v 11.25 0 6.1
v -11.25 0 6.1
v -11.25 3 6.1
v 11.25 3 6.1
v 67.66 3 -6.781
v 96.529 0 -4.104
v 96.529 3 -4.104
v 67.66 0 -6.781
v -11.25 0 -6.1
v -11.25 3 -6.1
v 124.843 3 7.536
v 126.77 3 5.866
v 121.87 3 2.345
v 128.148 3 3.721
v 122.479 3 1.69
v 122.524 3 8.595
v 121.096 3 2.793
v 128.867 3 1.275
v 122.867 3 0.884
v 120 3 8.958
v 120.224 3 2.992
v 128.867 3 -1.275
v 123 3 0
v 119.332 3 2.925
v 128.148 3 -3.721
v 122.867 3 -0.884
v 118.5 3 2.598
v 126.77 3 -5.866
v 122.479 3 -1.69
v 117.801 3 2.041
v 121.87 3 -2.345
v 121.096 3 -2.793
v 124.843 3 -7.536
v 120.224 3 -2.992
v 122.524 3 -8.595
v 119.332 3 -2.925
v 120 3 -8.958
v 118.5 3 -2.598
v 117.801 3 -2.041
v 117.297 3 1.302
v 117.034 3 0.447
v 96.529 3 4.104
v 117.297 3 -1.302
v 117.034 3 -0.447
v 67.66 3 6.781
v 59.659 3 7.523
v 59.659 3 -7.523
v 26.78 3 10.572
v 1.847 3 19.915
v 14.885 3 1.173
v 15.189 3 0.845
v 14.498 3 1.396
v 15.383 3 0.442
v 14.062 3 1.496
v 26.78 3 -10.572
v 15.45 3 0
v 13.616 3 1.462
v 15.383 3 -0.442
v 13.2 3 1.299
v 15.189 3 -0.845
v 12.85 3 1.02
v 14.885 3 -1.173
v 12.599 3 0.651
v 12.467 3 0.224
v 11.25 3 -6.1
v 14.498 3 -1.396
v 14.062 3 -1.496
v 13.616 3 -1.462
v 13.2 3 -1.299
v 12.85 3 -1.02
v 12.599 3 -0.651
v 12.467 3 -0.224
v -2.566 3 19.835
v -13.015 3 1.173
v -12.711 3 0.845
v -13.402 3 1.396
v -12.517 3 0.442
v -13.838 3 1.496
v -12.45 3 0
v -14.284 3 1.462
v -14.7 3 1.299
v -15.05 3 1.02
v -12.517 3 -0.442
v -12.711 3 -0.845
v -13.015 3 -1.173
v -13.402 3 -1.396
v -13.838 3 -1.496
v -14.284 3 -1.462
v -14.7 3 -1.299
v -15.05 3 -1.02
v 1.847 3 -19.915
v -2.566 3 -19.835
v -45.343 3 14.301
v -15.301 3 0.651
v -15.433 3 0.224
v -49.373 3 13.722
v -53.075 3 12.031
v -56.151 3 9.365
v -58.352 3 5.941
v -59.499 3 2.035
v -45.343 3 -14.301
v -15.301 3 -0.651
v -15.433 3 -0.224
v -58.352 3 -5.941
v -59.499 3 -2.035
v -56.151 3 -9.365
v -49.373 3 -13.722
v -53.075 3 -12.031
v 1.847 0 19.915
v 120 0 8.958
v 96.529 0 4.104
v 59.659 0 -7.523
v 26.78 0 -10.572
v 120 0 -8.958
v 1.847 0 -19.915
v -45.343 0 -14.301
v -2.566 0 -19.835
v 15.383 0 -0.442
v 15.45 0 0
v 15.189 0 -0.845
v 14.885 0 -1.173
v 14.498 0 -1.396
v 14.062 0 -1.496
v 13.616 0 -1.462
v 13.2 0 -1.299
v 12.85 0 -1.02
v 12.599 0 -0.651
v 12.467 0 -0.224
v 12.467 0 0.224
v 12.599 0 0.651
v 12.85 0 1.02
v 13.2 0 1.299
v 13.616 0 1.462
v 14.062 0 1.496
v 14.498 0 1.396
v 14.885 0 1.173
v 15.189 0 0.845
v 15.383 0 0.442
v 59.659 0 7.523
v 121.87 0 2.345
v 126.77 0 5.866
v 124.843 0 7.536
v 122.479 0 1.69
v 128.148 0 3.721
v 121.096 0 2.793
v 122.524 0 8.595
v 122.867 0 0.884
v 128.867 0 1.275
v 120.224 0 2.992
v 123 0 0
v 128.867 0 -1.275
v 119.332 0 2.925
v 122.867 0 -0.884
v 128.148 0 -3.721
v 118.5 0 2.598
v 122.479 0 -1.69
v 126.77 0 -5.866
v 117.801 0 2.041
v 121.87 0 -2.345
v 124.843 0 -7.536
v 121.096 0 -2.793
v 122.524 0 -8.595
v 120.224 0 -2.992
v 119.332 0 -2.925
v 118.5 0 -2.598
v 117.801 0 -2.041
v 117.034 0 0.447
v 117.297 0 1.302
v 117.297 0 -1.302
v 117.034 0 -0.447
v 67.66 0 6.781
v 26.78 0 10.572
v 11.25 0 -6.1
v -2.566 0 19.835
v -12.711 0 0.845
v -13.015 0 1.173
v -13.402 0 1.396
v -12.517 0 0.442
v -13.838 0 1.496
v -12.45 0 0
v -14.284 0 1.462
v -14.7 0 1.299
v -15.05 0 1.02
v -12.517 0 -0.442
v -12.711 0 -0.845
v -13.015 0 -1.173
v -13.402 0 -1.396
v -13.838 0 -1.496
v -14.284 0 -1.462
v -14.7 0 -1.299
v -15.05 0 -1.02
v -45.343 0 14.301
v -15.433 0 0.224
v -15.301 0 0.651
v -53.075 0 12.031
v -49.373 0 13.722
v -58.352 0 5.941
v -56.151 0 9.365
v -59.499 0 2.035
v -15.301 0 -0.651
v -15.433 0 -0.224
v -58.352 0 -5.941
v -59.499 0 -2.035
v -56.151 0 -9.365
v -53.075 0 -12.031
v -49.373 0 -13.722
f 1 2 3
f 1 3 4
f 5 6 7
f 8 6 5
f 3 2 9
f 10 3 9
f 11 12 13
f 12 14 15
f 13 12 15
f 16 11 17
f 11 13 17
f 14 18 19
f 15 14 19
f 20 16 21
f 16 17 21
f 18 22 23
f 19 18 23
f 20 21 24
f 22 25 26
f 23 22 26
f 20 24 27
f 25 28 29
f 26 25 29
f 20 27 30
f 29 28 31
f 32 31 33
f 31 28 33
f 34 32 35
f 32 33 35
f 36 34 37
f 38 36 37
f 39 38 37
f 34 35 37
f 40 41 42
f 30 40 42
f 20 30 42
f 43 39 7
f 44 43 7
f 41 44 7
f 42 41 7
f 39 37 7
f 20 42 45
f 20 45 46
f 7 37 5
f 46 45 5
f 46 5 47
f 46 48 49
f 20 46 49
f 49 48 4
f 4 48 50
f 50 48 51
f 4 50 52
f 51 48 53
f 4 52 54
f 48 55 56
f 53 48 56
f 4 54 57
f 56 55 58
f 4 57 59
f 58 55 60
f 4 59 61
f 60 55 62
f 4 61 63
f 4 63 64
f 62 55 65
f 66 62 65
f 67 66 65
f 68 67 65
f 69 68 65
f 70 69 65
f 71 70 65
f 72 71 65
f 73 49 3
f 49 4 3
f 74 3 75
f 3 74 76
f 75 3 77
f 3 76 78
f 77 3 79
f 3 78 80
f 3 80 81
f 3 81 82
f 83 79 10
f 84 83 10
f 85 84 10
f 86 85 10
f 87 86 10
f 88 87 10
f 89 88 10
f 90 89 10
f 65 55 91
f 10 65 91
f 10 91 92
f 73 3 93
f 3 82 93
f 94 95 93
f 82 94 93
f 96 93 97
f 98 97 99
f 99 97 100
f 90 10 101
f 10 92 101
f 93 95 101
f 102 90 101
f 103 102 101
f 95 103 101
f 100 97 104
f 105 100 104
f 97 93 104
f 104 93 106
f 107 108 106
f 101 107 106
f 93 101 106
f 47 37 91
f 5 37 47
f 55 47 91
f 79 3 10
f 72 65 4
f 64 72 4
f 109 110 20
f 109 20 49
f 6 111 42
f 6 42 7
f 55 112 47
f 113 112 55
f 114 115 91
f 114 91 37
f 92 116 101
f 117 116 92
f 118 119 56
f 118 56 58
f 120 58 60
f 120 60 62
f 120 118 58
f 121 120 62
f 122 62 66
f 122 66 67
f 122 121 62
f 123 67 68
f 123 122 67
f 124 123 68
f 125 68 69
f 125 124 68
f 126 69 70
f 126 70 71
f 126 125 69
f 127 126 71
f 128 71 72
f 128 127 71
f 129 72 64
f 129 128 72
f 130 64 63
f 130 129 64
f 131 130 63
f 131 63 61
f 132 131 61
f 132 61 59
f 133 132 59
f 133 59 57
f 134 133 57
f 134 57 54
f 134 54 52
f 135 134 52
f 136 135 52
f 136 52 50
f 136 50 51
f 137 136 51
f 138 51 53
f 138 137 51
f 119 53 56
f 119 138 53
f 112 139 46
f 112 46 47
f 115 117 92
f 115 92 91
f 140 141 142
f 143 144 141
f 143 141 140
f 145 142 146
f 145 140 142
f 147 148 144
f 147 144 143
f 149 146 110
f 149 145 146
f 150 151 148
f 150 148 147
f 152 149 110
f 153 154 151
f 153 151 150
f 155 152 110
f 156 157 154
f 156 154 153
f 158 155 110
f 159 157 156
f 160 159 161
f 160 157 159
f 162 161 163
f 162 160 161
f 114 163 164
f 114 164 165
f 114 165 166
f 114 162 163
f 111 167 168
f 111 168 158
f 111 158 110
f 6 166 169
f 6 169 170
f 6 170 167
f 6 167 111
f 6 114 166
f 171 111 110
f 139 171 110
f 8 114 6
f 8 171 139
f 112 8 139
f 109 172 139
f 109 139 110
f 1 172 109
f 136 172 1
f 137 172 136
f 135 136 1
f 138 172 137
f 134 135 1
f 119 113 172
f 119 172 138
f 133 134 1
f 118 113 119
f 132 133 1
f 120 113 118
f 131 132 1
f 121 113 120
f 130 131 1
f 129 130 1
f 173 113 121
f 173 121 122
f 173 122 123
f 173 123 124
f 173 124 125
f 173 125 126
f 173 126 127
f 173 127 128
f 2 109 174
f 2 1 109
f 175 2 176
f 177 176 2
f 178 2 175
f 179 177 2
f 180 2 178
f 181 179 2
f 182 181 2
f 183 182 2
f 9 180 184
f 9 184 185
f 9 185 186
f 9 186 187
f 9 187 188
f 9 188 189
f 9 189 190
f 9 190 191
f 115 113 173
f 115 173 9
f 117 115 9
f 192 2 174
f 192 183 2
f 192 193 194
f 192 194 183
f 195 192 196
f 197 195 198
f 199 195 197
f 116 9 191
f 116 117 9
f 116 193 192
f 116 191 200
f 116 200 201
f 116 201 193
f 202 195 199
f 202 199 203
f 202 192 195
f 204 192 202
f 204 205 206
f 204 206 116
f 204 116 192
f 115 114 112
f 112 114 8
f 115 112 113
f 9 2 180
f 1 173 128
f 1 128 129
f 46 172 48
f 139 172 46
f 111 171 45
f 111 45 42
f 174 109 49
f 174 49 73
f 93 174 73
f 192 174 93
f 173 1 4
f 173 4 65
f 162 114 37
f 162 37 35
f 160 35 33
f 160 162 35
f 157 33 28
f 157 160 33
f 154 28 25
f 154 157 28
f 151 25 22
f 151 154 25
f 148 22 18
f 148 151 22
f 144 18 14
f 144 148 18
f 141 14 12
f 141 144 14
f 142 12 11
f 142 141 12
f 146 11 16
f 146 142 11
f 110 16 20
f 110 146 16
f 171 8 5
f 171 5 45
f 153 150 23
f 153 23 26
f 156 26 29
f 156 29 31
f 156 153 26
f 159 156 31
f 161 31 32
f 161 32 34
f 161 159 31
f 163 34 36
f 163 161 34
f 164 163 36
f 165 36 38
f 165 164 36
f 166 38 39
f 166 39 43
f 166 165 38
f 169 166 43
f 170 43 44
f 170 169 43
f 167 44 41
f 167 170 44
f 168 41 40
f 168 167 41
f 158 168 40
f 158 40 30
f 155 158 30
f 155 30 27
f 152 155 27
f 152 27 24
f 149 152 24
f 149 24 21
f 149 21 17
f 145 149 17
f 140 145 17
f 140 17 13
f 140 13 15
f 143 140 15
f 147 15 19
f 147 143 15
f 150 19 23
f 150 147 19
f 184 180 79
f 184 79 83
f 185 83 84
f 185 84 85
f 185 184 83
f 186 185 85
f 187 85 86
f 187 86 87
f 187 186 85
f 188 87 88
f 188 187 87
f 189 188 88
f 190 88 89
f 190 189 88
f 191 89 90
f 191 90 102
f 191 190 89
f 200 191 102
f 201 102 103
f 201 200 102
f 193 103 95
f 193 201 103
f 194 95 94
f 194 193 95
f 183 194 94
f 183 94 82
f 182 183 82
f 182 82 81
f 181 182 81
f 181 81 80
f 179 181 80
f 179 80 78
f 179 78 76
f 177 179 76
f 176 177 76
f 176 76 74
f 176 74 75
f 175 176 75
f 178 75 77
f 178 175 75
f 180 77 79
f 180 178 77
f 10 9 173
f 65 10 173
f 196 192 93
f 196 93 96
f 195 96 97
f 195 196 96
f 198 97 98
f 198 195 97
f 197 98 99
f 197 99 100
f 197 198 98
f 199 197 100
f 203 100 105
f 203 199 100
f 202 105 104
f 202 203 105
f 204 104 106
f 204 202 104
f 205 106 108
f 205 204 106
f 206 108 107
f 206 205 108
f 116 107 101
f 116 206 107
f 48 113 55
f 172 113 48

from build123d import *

# Parameters (mm, degrees)
SKETCH1_R           = 1.5
SKETCH1_R_2         = 3
SKETCH1_W           = 22.5
SKETCH1_H           = 12.2
BOSS_EXTRUDE1_DEPTH = 3


with BuildPart() as part:
    # Sketch1 → Boss-Extrude1 (new body)
    with BuildSketch(Plane(origin=(0, 0, 0), x_dir=(1, 0, 0), z_dir=(0, 1, 0))):
        with BuildLine():
            Line((1.846751087, 19.91455524), (120, 8.957763171))
            ThreePointArc((120, 8.957763171), (128.957763171, 0), (120, -8.957763171))
            Line((120, -8.957763171), (1.846751087, -19.91455524))
            Line((1.846751087, -19.91455524), (-2.565887989, -19.834722555))
            Line((-2.565887989, -19.834722555), (-45.343490518, -14.300864634))
            ThreePointArc((-45.343490518, -14.300864634), (-59.644355152, 0), (-45.343490518, 14.300864634))
            Line((-45.343490518, 14.300864634), (-2.565887989, 19.834722555))
            Line((-2.565887989, 19.834722555), (1.846751087, 19.91455524))
        make_face()
        with Locations((13.95, 0)):
            Circle(SKETCH1_R, mode=Mode.SUBTRACT)
        with Locations((-13.95, 0)):
            Circle(SKETCH1_R, mode=Mode.SUBTRACT)
        with Locations((120, 0)):
            Circle(SKETCH1_R_2, mode=Mode.SUBTRACT)
        Rectangle(SKETCH1_W, SKETCH1_H, mode=Mode.SUBTRACT)
        Polygon((96.529167285, 4.104267173), (67.660347399, 6.781380665), (67.660347399, -6.781380665), (96.529167285, -4.104267173), align=None, mode=Mode.SUBTRACT)
        Polygon((59.65913304, 7.523363157), (26.779600723, 10.572404992), (26.779600723, -10.572404992), (59.65913304, -7.523363157), align=None, mode=Mode.SUBTRACT)
    extrude(amount=BOSS_EXTRUDE1_DEPTH)


solid = part.part
